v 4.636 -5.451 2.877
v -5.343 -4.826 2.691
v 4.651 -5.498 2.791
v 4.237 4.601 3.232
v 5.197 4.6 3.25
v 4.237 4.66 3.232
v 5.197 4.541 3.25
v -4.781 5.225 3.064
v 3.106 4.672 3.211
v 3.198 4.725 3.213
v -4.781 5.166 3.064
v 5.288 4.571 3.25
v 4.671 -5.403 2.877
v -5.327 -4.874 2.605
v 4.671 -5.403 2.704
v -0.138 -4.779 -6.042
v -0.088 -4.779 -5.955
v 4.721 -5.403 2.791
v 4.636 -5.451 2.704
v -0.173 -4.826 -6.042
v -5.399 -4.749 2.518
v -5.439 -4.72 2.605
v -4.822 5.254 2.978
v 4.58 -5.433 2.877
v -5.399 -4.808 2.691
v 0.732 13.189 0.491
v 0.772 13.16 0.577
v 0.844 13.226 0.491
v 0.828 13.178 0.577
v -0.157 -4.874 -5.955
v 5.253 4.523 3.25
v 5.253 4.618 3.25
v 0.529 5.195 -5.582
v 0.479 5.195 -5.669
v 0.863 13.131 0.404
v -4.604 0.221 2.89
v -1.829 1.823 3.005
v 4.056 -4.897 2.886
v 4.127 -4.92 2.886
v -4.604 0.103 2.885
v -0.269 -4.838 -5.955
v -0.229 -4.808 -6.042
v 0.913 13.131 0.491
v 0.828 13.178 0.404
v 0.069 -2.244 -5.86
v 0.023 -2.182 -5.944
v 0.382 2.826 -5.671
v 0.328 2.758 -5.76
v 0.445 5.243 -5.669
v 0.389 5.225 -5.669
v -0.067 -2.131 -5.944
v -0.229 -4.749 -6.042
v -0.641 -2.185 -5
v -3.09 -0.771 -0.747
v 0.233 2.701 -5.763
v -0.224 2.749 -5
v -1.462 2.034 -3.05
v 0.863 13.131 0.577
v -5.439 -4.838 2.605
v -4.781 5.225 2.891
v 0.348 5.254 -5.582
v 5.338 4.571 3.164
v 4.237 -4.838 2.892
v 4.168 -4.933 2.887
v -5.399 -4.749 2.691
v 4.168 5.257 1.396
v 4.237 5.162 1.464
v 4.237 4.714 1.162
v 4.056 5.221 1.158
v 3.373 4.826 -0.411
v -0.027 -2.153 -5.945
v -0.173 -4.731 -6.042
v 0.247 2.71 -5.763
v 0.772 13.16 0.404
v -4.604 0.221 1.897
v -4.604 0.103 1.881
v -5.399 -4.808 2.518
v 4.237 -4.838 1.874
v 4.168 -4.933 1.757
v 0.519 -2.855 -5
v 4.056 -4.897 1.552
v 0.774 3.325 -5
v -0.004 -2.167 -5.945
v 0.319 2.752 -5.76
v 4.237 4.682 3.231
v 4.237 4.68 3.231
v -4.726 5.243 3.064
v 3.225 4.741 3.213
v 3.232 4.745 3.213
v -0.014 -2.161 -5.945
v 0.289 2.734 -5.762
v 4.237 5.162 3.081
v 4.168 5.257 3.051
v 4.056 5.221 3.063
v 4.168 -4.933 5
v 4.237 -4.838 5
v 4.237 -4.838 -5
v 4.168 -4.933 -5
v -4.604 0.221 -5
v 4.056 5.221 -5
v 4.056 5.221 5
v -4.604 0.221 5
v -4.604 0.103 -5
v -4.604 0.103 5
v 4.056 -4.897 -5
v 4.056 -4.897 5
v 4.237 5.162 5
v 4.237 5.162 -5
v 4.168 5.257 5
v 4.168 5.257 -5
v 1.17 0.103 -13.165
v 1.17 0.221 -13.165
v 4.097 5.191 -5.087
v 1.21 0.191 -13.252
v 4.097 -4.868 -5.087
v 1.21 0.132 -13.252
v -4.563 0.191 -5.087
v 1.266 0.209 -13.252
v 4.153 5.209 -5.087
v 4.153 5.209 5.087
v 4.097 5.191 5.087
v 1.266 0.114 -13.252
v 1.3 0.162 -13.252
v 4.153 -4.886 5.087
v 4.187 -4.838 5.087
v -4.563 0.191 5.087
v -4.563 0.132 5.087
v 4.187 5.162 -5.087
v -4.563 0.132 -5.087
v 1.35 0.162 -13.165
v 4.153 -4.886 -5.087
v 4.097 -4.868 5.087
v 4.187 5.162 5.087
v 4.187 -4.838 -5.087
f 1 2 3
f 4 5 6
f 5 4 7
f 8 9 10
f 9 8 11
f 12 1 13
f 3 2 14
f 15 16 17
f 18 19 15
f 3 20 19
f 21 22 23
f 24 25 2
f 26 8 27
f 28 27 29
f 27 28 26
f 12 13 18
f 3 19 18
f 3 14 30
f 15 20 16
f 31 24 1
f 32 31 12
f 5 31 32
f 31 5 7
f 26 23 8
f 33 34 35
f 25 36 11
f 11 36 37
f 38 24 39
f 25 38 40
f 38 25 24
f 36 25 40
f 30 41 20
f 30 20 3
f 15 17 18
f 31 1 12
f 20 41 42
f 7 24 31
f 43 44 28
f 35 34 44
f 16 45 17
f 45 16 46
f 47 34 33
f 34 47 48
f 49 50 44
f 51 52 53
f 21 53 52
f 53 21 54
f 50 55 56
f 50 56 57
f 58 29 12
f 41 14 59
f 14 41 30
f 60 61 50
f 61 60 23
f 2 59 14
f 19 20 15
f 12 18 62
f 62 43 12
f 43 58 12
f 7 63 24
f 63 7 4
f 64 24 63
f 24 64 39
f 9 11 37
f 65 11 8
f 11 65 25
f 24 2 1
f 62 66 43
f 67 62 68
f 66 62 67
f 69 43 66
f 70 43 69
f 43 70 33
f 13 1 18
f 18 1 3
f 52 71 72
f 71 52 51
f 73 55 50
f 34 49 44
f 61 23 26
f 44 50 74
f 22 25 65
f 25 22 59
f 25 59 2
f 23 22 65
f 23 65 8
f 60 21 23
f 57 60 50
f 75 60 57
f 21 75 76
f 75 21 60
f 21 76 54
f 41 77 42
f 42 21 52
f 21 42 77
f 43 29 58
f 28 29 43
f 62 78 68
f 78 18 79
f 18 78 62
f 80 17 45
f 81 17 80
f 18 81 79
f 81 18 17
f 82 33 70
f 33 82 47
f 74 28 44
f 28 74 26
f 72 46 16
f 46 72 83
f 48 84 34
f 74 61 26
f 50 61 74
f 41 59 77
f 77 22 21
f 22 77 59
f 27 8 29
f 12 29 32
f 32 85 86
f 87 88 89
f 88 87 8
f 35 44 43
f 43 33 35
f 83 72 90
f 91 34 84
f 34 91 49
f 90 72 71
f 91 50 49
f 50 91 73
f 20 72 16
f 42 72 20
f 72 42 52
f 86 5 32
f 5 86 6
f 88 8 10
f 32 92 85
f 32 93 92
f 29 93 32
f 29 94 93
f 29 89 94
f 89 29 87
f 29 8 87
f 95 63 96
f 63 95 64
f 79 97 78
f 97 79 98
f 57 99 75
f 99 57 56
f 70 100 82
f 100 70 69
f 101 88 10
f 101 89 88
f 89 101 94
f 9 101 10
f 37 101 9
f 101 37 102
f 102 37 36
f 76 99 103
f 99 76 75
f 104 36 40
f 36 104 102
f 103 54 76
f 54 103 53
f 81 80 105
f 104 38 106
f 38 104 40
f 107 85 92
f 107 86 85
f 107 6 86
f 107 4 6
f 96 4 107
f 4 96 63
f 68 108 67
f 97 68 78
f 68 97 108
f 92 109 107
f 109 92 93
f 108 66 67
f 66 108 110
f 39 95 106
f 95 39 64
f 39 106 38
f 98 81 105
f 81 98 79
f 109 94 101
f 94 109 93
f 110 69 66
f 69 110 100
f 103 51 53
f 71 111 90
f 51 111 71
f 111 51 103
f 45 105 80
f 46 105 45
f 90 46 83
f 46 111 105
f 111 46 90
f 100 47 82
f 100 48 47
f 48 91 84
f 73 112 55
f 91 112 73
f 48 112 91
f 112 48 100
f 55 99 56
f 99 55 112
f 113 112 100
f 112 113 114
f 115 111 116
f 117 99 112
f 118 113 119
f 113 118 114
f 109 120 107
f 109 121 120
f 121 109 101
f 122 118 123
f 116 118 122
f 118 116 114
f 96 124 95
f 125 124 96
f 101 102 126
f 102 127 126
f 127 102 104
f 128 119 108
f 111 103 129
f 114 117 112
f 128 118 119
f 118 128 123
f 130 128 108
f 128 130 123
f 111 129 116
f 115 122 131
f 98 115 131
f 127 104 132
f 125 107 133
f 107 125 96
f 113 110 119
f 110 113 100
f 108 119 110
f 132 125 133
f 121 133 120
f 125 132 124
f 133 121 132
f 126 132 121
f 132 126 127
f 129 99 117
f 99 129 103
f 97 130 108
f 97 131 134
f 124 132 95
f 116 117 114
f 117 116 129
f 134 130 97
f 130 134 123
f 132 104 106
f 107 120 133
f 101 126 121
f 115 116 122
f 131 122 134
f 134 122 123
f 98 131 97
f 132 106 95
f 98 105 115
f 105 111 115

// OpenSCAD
// Auto-generated OpenSCAD file

    inner_points = 10*[[0.41372241203438104, 0.5161844232125496, -0.5000000000005286], [0.41372241203630644, 0.5161844232124951, 0.4999999999994715], [-0.4523012409070252, 0.01618139067572292, -0.49999999999888844], [-0.45230124090509977, 0.01618139067566849, 0.5000000000011117], [0.4137259137098271, -0.48381557678131953, -0.500000000000583], [0.41372591371175244, -0.483815576781374, 0.49999999999941697], [0.125049028277489, 0.016183412369028788, -1.316496580927726]];

    outer_points = 10*[[-0.47409817149378863, 0.5195152510494393, 0.29777199506773233], [-0.5358247145183108, -0.47788127840371986, 0.2604893325952726], [0.04291122844378145, 0.5195152510494393, -0.5582077245379332], [-0.018815314580740705, -0.47788127840371986, -0.5954903870103929], [0.5237767575867904, 0.4570642920808602, 0.3163597231788905], [0.4620502145622683, -0.540332237372299, 0.2790770607064307], [0.08126278284427152, 1.313069120854264, 0.049082497672875716]];

    // Convex hull for inner set (I)
    module inner_hull() {
        hull() {
            for (p = inner_points) {
                translate(p) sphere(r=0.1);
            }
        }
    }

    // Convex hull for outer set (O) minus inner hull (O \ I)
    module outer_minus_inner() {
        difference() {
            hull() {
                for (p = outer_points) {
                    translate(p) sphere(r=0.1);
                }
            }
            inner_hull(); // Subtract inner hull
        }
    }

    // Convex hull for outer set (O) minus all translated inner hulls
    module outer_minus_AllTranslationInner() {
        difference() {
            hull() {
                for (p = outer_points) {
                    translate(p) sphere(r=0.1);
                }
            }
            hull() {
                translate([0,0,50]) inner_hull();
                translate([0,0,-50]) inner_hull();
            }; // Subtract translated inner hulls
        }
    }

    // Difference between outer_minus_inner and outer_minus_AllTranslationInner
    module outer_minus_inner_diff() {
        difference() {
            // Outer minus inner
            difference() {
                hull() {
                    for (p = outer_points) {
                        translate(p) sphere(r=0.1);
                    }
                }
                inner_hull();
            }

            // Subtract Outer minus AllTranslationInner
            difference() {
                hull() {
                    for (p = outer_points) {
                        translate(p) sphere(r=0.1);
                    }
                }
                hull() {
                    translate([0,0,50]) inner_hull();
                    translate([0,0,-50]) inner_hull();
                };
            }
        }
    }

    // Rendering all with colors applied
    color([1, 0, 0, 0.5]) inner_hull(); // Transparent red
    color([0, 1, 0, 1]) outer_minus_AllTranslationInner(); // Opaque green
    color([1, 1, 0, 1]) outer_minus_inner_diff(); // Opaque yellow
    
